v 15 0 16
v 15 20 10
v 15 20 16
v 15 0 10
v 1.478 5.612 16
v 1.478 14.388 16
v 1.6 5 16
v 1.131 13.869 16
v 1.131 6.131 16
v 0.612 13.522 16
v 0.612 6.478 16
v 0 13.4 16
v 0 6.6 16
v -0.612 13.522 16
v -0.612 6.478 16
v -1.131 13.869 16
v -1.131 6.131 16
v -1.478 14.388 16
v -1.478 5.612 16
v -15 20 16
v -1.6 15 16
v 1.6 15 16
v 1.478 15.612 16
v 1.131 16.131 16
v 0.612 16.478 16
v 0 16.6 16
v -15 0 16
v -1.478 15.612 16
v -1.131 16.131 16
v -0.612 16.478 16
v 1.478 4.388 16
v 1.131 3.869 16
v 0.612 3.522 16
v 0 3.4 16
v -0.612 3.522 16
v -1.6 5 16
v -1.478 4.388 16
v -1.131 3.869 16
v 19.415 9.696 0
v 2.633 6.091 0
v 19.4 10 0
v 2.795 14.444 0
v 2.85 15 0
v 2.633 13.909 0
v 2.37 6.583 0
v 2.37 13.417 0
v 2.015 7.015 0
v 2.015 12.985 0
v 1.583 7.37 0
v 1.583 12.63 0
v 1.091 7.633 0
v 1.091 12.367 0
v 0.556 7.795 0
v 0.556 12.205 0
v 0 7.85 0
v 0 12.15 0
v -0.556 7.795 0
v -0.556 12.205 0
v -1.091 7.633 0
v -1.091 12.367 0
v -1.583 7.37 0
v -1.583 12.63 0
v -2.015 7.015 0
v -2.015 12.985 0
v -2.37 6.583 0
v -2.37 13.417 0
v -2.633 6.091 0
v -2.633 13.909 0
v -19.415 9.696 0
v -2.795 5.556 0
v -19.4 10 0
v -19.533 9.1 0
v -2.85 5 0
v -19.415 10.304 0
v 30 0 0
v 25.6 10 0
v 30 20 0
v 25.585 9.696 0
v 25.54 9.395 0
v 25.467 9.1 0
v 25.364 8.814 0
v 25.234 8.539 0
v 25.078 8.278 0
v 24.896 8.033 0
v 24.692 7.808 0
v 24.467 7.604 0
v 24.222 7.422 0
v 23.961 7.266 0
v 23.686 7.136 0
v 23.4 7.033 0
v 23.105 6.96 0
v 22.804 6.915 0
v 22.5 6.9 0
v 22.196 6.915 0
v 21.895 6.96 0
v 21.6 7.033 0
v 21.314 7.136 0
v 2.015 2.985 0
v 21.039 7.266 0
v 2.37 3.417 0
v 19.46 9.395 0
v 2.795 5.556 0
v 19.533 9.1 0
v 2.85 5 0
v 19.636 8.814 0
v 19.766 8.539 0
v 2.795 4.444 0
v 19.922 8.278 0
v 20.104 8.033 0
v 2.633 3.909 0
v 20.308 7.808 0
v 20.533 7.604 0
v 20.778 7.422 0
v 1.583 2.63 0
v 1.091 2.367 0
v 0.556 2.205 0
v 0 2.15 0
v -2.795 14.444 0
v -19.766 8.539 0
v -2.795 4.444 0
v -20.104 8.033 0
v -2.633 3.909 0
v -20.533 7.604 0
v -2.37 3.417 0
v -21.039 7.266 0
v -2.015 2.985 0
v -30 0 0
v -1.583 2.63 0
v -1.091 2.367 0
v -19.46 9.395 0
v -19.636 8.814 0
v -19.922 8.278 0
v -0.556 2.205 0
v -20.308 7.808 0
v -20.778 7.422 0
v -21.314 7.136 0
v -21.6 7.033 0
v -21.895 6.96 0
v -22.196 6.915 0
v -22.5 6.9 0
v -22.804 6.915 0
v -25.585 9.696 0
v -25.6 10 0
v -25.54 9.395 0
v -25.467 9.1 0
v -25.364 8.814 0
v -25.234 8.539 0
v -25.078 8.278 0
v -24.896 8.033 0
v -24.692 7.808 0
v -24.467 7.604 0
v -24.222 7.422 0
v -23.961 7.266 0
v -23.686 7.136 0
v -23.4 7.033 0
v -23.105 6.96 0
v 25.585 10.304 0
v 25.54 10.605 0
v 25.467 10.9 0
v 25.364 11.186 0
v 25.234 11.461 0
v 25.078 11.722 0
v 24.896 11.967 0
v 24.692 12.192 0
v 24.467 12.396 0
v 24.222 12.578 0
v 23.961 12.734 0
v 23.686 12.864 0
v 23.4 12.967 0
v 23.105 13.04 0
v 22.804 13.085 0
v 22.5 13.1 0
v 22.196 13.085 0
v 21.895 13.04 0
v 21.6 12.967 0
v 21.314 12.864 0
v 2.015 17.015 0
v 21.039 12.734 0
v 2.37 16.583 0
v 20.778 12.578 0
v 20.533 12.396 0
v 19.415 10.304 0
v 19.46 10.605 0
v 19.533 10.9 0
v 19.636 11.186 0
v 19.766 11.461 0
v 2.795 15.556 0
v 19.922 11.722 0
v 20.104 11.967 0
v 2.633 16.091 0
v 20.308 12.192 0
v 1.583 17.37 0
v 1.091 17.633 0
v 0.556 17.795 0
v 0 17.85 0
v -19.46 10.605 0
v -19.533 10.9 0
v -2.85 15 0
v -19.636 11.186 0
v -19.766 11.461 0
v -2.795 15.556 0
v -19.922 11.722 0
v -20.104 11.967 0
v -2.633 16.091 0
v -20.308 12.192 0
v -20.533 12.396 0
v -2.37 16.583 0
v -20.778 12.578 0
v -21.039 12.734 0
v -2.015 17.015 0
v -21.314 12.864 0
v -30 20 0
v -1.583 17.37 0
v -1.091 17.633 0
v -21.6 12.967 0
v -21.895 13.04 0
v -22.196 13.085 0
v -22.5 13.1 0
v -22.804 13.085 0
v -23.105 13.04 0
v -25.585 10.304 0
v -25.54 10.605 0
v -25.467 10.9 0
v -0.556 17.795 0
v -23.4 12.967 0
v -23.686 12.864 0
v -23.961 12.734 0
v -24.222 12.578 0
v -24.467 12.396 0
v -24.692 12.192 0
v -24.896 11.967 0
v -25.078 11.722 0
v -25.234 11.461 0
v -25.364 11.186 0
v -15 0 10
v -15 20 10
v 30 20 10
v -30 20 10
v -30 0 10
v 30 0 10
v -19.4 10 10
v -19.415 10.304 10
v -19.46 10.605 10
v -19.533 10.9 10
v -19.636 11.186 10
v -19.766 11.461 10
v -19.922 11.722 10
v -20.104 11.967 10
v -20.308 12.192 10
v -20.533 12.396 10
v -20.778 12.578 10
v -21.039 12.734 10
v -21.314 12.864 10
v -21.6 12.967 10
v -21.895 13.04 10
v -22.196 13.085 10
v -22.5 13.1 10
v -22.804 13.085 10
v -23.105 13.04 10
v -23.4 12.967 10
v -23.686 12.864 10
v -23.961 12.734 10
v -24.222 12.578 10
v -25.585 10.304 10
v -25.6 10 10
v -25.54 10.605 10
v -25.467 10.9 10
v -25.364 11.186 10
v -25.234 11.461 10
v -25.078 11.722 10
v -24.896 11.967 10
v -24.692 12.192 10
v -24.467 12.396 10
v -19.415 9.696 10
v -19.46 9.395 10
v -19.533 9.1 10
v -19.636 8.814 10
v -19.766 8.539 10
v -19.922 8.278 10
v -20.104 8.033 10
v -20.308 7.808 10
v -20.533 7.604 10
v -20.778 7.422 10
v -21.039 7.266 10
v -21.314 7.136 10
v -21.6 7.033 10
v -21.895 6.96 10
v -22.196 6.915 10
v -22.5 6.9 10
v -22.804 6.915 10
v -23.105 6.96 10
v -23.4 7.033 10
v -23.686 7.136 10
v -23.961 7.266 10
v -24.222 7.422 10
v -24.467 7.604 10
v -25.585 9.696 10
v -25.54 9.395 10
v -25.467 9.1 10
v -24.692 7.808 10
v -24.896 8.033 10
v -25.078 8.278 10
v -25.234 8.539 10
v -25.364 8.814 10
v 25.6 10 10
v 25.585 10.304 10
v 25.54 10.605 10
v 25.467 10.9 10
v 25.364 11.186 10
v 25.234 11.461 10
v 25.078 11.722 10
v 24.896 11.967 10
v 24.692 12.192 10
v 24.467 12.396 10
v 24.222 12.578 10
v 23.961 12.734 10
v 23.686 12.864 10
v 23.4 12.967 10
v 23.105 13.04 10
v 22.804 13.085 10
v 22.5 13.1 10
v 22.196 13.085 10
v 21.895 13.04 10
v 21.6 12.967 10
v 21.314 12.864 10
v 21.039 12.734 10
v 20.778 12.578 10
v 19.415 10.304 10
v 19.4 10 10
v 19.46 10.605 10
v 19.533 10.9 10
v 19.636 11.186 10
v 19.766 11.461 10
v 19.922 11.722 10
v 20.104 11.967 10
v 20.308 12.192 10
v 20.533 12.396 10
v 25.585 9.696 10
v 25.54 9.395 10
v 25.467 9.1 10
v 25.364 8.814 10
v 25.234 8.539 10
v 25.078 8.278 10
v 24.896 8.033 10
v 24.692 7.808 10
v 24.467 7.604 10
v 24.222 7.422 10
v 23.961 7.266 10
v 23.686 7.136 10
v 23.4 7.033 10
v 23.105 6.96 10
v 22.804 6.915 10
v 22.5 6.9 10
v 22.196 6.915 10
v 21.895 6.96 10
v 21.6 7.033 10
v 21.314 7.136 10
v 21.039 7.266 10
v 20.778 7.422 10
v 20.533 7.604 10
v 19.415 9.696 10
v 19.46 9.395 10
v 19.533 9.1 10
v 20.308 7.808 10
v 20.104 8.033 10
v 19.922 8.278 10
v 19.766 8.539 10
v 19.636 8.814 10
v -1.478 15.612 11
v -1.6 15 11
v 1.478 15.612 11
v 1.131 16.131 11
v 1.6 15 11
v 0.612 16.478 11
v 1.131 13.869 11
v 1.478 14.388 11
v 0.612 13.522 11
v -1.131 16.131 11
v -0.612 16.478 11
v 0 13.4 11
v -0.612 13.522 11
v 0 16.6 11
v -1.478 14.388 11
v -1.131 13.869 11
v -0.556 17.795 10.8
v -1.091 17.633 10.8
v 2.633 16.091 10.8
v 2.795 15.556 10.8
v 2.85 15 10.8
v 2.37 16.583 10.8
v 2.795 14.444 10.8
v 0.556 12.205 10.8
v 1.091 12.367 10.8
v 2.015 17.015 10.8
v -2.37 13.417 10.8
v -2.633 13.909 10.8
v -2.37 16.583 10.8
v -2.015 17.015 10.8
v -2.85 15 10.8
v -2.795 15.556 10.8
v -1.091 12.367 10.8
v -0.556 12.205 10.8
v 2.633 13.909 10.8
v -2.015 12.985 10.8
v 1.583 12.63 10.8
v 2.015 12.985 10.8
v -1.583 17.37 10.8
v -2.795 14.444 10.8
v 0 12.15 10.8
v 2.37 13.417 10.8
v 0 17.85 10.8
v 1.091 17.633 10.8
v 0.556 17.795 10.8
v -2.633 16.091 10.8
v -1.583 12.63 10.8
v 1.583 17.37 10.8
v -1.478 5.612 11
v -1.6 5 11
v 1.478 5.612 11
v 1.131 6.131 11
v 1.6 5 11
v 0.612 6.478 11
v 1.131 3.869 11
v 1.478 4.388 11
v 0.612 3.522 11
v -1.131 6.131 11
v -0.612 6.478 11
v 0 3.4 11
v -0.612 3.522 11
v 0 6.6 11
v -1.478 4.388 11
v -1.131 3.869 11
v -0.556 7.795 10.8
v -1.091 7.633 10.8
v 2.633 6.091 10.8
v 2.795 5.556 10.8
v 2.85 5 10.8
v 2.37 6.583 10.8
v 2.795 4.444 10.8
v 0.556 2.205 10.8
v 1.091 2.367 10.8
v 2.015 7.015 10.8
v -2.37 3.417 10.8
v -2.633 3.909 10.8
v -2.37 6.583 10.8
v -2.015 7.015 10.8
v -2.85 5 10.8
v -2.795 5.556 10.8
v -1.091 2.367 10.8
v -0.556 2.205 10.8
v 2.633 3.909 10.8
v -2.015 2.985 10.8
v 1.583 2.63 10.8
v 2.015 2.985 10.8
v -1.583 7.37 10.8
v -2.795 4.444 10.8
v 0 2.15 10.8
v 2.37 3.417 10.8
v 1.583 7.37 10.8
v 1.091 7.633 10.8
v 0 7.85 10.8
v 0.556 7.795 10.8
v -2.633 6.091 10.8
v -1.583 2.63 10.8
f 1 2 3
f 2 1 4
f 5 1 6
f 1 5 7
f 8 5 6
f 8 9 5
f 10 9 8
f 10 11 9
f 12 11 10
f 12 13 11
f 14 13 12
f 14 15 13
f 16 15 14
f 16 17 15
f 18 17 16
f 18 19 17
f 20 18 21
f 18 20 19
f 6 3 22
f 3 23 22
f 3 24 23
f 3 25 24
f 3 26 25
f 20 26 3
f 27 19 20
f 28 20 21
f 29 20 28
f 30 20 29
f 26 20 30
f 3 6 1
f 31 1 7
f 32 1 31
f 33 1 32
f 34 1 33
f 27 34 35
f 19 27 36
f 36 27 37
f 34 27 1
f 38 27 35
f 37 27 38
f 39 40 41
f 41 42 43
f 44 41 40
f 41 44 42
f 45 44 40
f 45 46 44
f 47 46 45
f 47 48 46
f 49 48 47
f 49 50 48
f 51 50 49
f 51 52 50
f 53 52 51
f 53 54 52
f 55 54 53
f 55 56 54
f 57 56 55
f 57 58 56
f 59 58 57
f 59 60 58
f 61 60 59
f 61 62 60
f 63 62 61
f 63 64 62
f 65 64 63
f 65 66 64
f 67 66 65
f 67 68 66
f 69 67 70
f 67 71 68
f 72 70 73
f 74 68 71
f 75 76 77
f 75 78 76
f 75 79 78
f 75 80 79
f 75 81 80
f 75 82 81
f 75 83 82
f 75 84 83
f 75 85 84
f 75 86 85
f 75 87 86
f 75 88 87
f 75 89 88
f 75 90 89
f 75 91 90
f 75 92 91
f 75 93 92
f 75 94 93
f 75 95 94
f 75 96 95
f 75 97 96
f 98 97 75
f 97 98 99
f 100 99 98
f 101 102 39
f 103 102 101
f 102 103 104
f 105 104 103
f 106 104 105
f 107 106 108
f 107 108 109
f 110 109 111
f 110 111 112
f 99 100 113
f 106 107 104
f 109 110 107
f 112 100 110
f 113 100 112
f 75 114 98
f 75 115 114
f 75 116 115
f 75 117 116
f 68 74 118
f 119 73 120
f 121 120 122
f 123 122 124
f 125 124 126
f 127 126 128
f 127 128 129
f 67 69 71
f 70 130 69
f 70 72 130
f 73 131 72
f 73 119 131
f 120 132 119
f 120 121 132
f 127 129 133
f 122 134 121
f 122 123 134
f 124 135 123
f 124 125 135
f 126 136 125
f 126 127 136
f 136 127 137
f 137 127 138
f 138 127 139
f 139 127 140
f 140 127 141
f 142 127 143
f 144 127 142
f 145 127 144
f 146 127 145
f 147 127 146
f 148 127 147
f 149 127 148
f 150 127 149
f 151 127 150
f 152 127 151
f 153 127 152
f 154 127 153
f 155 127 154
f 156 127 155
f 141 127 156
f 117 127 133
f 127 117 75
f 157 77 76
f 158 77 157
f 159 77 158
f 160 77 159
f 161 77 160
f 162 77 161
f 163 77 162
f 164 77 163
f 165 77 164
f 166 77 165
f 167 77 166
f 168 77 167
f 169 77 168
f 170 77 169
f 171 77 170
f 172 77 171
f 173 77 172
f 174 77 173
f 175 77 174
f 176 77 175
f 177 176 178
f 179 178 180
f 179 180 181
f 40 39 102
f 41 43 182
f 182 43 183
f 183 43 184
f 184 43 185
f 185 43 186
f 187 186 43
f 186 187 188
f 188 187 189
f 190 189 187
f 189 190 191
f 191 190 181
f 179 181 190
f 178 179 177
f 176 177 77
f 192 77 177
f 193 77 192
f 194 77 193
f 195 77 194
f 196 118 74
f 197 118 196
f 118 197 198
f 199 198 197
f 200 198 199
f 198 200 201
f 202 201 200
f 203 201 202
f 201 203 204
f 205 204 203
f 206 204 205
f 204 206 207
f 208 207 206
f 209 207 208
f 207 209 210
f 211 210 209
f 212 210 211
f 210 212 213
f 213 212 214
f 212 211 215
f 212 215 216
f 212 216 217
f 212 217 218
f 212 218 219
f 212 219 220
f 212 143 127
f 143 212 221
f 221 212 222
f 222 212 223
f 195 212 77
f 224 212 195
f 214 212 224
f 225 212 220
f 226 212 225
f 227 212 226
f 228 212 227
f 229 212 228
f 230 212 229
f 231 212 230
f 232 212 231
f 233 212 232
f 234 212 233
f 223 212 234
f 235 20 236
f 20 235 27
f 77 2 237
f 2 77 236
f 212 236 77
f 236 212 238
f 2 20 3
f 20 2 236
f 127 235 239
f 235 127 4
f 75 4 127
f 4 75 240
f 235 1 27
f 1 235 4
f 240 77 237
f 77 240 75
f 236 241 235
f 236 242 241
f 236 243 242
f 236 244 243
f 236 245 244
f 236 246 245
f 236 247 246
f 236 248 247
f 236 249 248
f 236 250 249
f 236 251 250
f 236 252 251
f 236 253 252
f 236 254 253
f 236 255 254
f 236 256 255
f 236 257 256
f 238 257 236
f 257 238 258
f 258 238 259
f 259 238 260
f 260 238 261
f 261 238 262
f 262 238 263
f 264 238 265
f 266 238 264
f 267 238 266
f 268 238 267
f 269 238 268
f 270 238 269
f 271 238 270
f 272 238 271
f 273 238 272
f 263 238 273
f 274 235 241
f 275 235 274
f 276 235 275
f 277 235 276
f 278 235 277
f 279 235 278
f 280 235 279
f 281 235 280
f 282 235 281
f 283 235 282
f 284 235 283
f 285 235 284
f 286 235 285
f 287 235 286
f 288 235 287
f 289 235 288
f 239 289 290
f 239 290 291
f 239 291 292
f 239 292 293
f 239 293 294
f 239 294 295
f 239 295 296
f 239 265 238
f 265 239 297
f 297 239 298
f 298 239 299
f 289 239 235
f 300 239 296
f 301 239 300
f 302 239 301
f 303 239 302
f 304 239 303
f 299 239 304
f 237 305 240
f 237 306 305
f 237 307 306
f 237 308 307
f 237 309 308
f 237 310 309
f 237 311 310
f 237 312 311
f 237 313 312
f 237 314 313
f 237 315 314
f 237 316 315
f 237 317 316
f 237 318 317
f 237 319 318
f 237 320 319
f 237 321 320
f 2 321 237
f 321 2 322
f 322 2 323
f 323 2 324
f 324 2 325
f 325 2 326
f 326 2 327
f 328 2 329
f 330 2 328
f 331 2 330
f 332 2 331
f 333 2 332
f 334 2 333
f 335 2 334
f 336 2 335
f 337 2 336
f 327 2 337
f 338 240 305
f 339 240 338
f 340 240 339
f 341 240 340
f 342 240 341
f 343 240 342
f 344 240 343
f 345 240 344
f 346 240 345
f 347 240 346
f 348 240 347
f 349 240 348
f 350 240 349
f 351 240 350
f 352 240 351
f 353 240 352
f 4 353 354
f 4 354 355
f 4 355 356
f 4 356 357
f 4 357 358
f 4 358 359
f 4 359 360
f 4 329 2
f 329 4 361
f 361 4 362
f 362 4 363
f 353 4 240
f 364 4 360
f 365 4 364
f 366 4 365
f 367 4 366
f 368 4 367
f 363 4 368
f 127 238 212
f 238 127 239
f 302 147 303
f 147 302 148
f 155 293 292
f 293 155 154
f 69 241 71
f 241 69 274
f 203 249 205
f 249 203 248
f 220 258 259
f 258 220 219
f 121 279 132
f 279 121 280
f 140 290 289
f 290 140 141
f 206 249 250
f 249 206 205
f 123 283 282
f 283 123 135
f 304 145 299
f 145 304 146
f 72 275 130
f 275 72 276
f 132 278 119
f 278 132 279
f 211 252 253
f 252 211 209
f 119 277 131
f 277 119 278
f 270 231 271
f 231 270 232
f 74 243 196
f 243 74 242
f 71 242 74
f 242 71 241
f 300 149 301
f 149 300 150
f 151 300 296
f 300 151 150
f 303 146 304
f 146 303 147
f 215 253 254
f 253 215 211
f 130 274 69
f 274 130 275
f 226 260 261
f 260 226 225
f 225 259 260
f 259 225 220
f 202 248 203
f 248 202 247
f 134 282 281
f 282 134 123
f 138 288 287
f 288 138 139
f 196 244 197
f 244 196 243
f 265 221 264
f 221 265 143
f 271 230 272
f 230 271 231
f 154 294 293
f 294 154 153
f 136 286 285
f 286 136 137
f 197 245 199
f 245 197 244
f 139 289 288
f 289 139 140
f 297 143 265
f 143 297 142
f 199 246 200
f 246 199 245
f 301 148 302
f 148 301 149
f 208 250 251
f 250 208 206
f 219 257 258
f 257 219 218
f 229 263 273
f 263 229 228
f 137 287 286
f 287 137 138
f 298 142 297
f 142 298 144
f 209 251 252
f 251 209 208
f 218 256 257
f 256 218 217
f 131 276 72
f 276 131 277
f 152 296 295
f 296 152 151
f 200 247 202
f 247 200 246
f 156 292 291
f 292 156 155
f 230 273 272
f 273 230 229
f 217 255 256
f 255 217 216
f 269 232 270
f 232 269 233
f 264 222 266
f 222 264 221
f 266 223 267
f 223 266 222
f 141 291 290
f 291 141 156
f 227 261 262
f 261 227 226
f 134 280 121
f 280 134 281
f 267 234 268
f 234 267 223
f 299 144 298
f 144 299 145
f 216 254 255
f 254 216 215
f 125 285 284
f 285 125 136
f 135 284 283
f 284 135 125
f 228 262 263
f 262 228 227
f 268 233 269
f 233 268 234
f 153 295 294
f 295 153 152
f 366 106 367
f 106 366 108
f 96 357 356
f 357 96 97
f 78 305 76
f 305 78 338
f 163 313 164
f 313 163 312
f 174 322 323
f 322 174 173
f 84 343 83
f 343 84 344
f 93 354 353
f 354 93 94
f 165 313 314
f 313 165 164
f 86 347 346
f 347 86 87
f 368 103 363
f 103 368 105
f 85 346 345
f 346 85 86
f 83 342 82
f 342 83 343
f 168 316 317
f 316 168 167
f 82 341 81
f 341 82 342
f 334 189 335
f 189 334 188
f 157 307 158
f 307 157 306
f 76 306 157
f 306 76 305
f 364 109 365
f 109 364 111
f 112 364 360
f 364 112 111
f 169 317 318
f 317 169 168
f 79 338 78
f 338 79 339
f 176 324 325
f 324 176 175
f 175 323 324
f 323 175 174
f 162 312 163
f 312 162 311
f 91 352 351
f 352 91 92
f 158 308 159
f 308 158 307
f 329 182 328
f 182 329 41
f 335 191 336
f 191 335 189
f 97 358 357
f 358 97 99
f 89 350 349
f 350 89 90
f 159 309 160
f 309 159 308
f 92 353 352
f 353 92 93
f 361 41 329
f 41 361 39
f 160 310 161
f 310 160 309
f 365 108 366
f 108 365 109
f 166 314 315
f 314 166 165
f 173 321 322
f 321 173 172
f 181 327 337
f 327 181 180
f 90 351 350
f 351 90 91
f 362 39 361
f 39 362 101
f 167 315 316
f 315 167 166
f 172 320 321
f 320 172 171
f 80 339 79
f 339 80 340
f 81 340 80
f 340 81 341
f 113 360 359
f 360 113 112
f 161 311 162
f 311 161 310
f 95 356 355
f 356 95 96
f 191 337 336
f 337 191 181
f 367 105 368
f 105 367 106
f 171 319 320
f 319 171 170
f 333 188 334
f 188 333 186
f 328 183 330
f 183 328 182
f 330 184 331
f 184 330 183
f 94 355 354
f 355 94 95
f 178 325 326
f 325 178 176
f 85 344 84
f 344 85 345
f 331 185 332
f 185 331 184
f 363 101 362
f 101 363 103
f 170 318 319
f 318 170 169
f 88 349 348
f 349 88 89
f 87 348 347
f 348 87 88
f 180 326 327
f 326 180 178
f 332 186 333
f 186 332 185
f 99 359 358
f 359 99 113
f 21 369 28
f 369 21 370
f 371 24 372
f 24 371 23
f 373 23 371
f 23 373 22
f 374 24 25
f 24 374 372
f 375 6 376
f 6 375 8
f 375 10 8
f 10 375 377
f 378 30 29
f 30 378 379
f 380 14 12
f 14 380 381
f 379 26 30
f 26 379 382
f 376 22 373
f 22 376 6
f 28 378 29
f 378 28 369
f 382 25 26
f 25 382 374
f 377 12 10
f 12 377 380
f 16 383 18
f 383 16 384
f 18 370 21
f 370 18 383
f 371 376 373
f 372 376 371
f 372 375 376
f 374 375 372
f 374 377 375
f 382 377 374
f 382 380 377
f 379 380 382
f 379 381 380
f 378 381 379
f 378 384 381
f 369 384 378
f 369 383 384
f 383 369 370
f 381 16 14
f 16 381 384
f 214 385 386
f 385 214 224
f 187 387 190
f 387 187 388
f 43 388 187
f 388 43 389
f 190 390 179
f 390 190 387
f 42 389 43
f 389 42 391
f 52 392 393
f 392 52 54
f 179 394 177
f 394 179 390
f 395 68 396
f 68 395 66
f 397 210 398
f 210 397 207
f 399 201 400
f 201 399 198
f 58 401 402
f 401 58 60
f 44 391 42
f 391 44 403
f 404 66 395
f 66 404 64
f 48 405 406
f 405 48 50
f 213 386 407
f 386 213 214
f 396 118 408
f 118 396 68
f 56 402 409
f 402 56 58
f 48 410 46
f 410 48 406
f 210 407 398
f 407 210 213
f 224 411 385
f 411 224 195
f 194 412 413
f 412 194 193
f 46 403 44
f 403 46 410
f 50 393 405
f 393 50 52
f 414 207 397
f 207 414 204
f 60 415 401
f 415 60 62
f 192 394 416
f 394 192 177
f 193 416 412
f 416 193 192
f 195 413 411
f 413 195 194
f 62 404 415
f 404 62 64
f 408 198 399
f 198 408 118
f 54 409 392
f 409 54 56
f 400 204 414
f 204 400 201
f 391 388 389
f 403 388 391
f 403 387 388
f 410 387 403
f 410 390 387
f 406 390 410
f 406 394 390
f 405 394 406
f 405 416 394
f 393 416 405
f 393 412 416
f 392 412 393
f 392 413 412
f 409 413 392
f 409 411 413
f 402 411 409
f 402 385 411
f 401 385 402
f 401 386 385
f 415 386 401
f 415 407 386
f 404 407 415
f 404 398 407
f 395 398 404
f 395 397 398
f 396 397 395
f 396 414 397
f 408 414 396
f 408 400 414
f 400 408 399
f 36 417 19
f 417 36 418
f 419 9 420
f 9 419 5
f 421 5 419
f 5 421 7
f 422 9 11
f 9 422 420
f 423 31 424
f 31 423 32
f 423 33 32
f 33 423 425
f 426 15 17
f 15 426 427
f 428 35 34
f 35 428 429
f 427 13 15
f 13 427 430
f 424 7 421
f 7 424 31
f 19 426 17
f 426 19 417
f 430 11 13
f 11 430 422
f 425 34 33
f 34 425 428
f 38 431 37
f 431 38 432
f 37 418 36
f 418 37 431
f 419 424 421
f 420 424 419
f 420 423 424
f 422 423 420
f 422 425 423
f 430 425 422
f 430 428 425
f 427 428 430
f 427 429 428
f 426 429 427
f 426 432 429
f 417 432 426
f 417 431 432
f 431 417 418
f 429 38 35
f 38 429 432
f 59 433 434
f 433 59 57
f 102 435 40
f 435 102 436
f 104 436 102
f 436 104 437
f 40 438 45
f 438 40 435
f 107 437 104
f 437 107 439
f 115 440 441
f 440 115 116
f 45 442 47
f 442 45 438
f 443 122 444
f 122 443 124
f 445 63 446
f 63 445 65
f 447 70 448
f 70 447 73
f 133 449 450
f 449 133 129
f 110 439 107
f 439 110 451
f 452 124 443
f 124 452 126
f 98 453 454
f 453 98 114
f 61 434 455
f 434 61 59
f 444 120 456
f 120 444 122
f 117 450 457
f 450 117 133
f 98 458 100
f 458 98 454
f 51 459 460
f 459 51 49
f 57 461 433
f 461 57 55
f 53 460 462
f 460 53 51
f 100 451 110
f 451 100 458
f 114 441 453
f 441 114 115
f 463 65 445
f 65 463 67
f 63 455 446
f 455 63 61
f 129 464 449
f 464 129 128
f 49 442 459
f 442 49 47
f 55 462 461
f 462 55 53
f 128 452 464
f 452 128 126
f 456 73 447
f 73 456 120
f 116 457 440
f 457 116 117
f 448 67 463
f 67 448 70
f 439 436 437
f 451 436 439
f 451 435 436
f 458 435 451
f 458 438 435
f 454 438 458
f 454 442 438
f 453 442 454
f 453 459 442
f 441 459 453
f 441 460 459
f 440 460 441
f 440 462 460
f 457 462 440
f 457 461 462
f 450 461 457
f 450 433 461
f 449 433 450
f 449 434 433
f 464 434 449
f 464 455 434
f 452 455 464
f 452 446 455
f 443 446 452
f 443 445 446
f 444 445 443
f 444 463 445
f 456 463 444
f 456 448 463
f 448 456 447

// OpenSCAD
// file: Constants.scad
// CNC Engraver
// https://github.com/mprochnow/CNC-Engraver
// Original author: Martin J. Prochnow <email@martin-prochnow.de>
// License: CC BY-SA 4.0 (Attribution-ShareAlike 4.0 International, http://creativecommons.org/licenses/by-sa/4.0/)

// This file contains constant values which should not be changed.

pcb_width = 160;
pcb_depth = 100;
pcb_height = 1.5;

m2_5_nut_height = 2;
m2_5_nut_width = 5;

m2_5_panhead_screw_height = 1.5;

m3_nut_height = 2.4;
m3_nut_width = 5.5;

m3_screw_head_dia = 5.5;
m3_screw_head_height = 3;

m3_grub_screw_length = 4;

m4_nut_width = 7;
m4_nut_height = 3.2;

m4_screw_head_dia = 7;
m4_screw_head_height = 4;

m5_nut_width = 8;
m5_nut_height = 4;

m5_screw_head_dia = 8.5;
m5_screw_head_height = 5;

m5_flat_head_screw_head_dia = 9.5;
m5_flat_head_screw_head_height = 2.75;

m8_nut_height = 6.5;
m8_nut_width = 13;
m8_lock_nut_height = 8;
m8_flat_nut_height = 4;

m8_washer_od = 16;
m8_washer_id = 8.4;
m8_washer_height = 1.6;

m8_socket_dia = 18;

m16_nut_height = 13;
m16_nut_width = 24;

608_bearing_height = 7;
608_bearing_od = 22;
608_bearing_outer_dia = 22;

lm8uu_length = 24;
lm8uu_od = 15;

nema17_width = 42.3;
nema17_screw_distance = 31;
nema17_shaft_length = 23;
nema17_cylinder_dia = 22;

shaft_coupler_length = 25;
shaft_coupler_outer_dia = 19;
shaft_coupler_screw_offset = 4;

anti_backlash_nut_width = 33.9;
anti_backlash_nut_depth = 32.8;
anti_backlash_nut_height = 12;
anti_backlash_nut_screw_offset = -10;
anti_backlash_nut_screw_distance = 20;
anti_backlash_nut_screw_dia = 5;

micromot_mount_dia = 20;
micromot_mount_height = 9;
micromot_max_dia = 34.2;

spindle_dia = 52;

gt2_pulley_20t_dia = 16;
gt2_pulley_20t_teeth_dia = 12;
gt2_pulley_20t_height = 16;

sk20_height = 51;
sk20_depth = 20;
sk20_base_width = 60;
sk20_base_height = 10;
sk20_mount_screw_dia = 6;
sk20_mount_screw_distance = 45;
sk20_rail_mount_offset = 31;

8mm_collar_dia = 16;
8mm_collar_height = 8.15;

arduino_uno_pcb_length = 68.6;
arduino_uno_pcb_width = 53.34;
arduino_uno_pcb_height = 0.6;
arduino_uno_usb_plug_x_offset = -8.0;
arduino_uno_usb_plug_y_offset = 31.7;
arduino_uno_mounting_holes = [[14, 2.5], [66.1, 7.6], [66.1, 35.5], [15.3, 50.7]];

arduino_uno_cnc_shield_stepper_driver_height = 33;

usb_type_a_plug_width = 12;
usb_type_a_plug_height = 11.9;

laser_module_width = 30;
laser_module_depth = 30;
laser_module_height = 45;
laser_module_mount_screw_distance = 20;
laser_module_mount_screw_distance2 = 40;
// file: Measurements.scad
// CNC Engraver
// https://github.com/mprochnow/CNC-Engraver
// Original author: Martin J. Prochnow <email@martin-prochnow.de>
// License: CC BY-SA 4.0 (Attribution-ShareAlike 4.0 International, http://creativecommons.org/licenses/by-sa/4.0/)

// Changing the values in this file results in changes to the parts.

include <Constants.scad>


nozzle_width = 0.4;
play = 0.2;

profile_width = 20;

x_axis_smooth_rod_length = 250;
x_axis_smooth_rod_dia = 8;
y_axis_smooth_rod_length = 210;
y_axis_smooth_rod_dia = 8;
z_axis_smooth_rod_length = 150;
z_axis_smooth_rod_dia = 8;

x_axis_smooth_rod_distance = 3 * profile_width;
y_axis_smooth_rod_distance = 120;
z_axis_smooth_rod_distance = 60;

x_axis_motor_belt_length = 200;
y_axis_motor_belt_length = 144;
z_axis_motor_belt_length = 122;

x_carriage_plate_thickness = 5; // TODO: fix issue with z-axis motor holder when plate thickness is not 5
z_carriage_plate_thickness = 5;

stepper_motor_length = 40;
stepper_motor_overall_length = stepper_motor_length + nema17_shaft_length;
stepper_adapter_height = 50;
stepper_adapter_screw_mount_height = 5;

table_width = 200;
table_depth = 120;
table_height = 15;

tool_offset = 44;

y_axis_lm8uu_distance = 20;

z_axis_vertical_offset = 2 * profile_width +
                         3 * nozzle_width + 608_bearing_od + 3 * nozzle_width +
                         2 +
                         table_height +
                         tool_offset;

z_axis_base_width = 90;
z_axis_carriage_height = profile_width + 2 * lm8uu_length;

portal_height = 200;
base_depth = 300;

hose_od = 26;

dust_show_opening_height = tool_offset - sk20_depth - 5 - 2*4*nozzle_width;
dust_shoe_width = 4 * nozzle_width + 30.7 + play + 4 * nozzle_width;
dust_shoe_depth = 35 + 6 * nozzle_width + hose_od + 6 * nozzle_width - play;
dust_shoe_height = 4 * nozzle_width + dust_show_opening_height + 4 * nozzle_width + 20 + play/2 + 4 * nozzle_width;

arduino_case_wall_thickness = 6 * nozzle_width;
arduino_case_standoff_height = 2.5;
arduino_case_pcb_clearance = arduino_case_wall_thickness + 1;
arduino_case_width = arduino_case_wall_thickness + 16 + arduino_uno_pcb_width + arduino_case_pcb_clearance + arduino_case_wall_thickness;
arduino_case_depth = arduino_case_wall_thickness + 23 + arduino_uno_pcb_length - arduino_uno_usb_plug_x_offset;
arduino_case_height = arduino_case_wall_thickness + arduino_case_standoff_height + arduino_uno_cnc_shield_stepper_driver_height + 8;

/// utility modules ////////////////////////////////////////////////
module hex_nut(width, height, center=false) {
    cylinder(r=(width/sin(60)/2), h=height, center=center, $fn=6);
}

module endstop_pcb(screw1=true, screw2=true) {
    pcb_width = 41;
    pcb_depth = 16.5;
    pcb_height = 1.6;

    translate([0, 0, -pcb_height])
    union() {
        cube([pcb_width, pcb_depth, pcb_height+10]);

        // placeholder for micro-switch pins
        translate([6.2, 6.5, -2])
            cube([13.5, 5, 2.1]);

        // placeholder for connector pins
        translate([26.7, 3, -2])
            cube([3, pcb_depth-6, 2.1]);
    }

    translate([0, 2.75, -8])
    union() {
        if (screw1) {
            translate([3.7, 0, 0])
                cylinder(d=3+play, h=8.5, $fn=32);
        }

        if (screw2) {
            translate([22.7, 0, 0])
                cylinder(d=3+play, h=8.5, $fn=32);
        }
    }
}

module stepper_mount(height=5) {
    width=nema17_width;

    intersection() {
        cube([width, width, height]);

        translate([width/2, width/2, -0.1])
            cylinder(r=27, h=height+0.2, $fn=256);
    }
}

module cylinder_cutout(diameter, height, top_corner_radius=0, bottom_corner_radius=0, fn=64, corner_fn=32) {
    union() {
        if (top_corner_radius) {
            translate([0, 0, height-top_corner_radius])
            difference() {
                cylinder(d=diameter+2*top_corner_radius, h=top_corner_radius+0.1, $fn=fn);

                translate([0, 0, 0.1])
                rotate_extrude($fn=fn)
                translate([diameter/2+top_corner_radius, 0, 0])
                    circle(r=top_corner_radius, $fn=32);
            }
        }

        translate([0, 0, bottom_corner_radius-0.1])
            cylinder(d=diameter, h=height-top_corner_radius-bottom_corner_radius+0.2, $fn=fn);

        if (bottom_corner_radius) {
            translate([0, 0, -0.1])
            difference() {
                cylinder(d=diameter+2*bottom_corner_radius, h=bottom_corner_radius+0.1, $fn=fn);

                translate([0, 0, bottom_corner_radius])
                rotate_extrude($fn=fn)
                translate([diameter/2+bottom_corner_radius, 0, 0])
                    circle(r=bottom_corner_radius, $fn=corner_fn);
            }
        }
    }
}

module wedge(a, b, height) {
    difference() {
        cube([a, b, height]);

        translate([0, b, 0])
        rotate([0, 0, -(90-atan(a/b))])
        translate([-1, 0, -1])
            cube([sqrt(pow(a,2)+pow(b,2))+2, b, height+2]);
    }
}

module micromot_50() {
    translate([0, 0, 30+25])
    color("DarkGreen")
        cylinder(d=34.2, h=80, $fn=32);

    translate([0, 0, 30])
    color("DarkGreen")
        cylinder(d1=21, d2=34.2, h=25);

    translate([0, 0, 0])
    color("Black")
        cylinder(d=21.2, h=30, $fn=32);

    translate([0, 0, -micromot_mount_height])
    color("Silver")
        cylinder(d=micromot_mount_dia, h=micromot_mount_height, $fn=32);

    translate([0, 0, -micromot_mount_height-7])
    union() {
        color("Silver")
            cylinder(d1=15, d2=20, h=7, $fn=32);

        translate([0, 0, -12])
        union() {
            color("Black")
                cylinder(d=10, h=12, $fn=32);

            translate([0, 0, -15])
            color("Silver")
                cylinder(d=3, h=15, $fn=16);
        }
    }
}

module sk20() {
	color("lightgrey")
    difference() {
        union() {
            translate([-30, -10, 0])
                cube([60, 20, 10]);
            
            translate([-15, -10, 0])
                cube([30, 20, 51]);
        }
    
        for (i=[-1, 1])
        translate([i*sk20_mount_screw_distance/2, 0, -0.1])
            cylinder(d=sk20_mount_screw_dia, h=10.2, $fn=16);
        
        translate([0, -10.1, 31])
        rotate([-90, 0, 0])
            cylinder(d=20, h=20.2, $fn=32);
        
        translate([-1, -10.1, 31])
            cube([2, 20.2, 20.1]);
        
        translate([0, 0, 45])
        rotate([0, 90, 0])
            cylinder(d=6, h=15.1, $fn=16);
    }
}

module arduino_uno() {
    linear_extrude(arduino_uno_pcb_height) {
        difference() {
            polygon([[0, 0],
                     [arduino_uno_pcb_length-2.54, 0],
                     [arduino_uno_pcb_length-2.54, 1.27],
                     [arduino_uno_pcb_length, 3.81],
                     [arduino_uno_pcb_length, 38.1],
                     [arduino_uno_pcb_length-2.54, 40.64],
                     [arduino_uno_pcb_length-2.54, 50.8],
                     [arduino_uno_pcb_length-5.08, arduino_uno_pcb_width],
                     [0, arduino_uno_pcb_width]]);
            
            for (p=arduino_uno_mounting_holes) {
                translate([p[0], p[1]])
                    circle(d=3.2, h=arduino_uno_pcb_height, $fn=16);
            }
        }
    }
}
// main file
// CNC Engraver
// https://github.com/mprochnow/CNC-Engraver
// Original author: Martin J. Prochnow <email@martin-prochnow.de>
// License: CC BY-SA 4.0 (Attribution-ShareAlike 4.0 International, http://creativecommons.org/licenses/by-sa/4.0/)

// This file contains part(s) for mouting a laser module

include <Measurements.scad>


module laser_module_mount() {
    difference() {
        union() {
            translate([-laser_module_width/2, 0, 0])
                cube([laser_module_width, sk20_depth, sk20_rail_mount_offset-laser_module_depth/2]);
            
            translate([-sk20_base_width/2, 0, 0])
                cube([sk20_base_width, sk20_depth, sk20_base_height]);
        }

        for (i=[-1, 1])
        translate([i*sk20_mount_screw_distance/2, sk20_depth/2, -0.1])
            cylinder(d=sk20_mount_screw_dia+play, h=sk20_base_height+0.2, $fn=64);

        translate([0, laser_module_height/2-(laser_module_mount_screw_distance2-laser_module_mount_screw_distance), 0])
        translate([0, laser_module_height/2, 0]) {
            translate([0, -laser_module_mount_screw_distance/2, sk20_rail_mount_offset-laser_module_depth/2-5])
                cylinder(d=3+play, h=5.1, $fn=16);
                
            translate([0, -laser_module_mount_screw_distance/2, -0.1])
                cylinder(d=m3_screw_head_dia+play, h=sk20_rail_mount_offset-laser_module_depth/2-5-0.1, $fn=32);

            translate([0, -laser_module_mount_screw_distance2/2, sk20_rail_mount_offset-laser_module_depth/2-5])
                cylinder(d=3+play, h=5.1, $fn=16);
                
            translate([0, -laser_module_mount_screw_distance2/2, -0.1])
                cylinder(d=m3_screw_head_dia+play, h=sk20_rail_mount_offset-laser_module_depth/2-5-0.1, $fn=32);
        }
    }
}

module laser_module() {
    translate([-laser_module_width/2, -laser_module_depth/2, 0])
    color("gray")
        cube([laser_module_width, laser_module_depth, laser_module_height]);
    
    translate([0, 0, -10])
    color("gray")
        cylinder(d=15, h=10, $fn=16);
}

laser_module_mount();
